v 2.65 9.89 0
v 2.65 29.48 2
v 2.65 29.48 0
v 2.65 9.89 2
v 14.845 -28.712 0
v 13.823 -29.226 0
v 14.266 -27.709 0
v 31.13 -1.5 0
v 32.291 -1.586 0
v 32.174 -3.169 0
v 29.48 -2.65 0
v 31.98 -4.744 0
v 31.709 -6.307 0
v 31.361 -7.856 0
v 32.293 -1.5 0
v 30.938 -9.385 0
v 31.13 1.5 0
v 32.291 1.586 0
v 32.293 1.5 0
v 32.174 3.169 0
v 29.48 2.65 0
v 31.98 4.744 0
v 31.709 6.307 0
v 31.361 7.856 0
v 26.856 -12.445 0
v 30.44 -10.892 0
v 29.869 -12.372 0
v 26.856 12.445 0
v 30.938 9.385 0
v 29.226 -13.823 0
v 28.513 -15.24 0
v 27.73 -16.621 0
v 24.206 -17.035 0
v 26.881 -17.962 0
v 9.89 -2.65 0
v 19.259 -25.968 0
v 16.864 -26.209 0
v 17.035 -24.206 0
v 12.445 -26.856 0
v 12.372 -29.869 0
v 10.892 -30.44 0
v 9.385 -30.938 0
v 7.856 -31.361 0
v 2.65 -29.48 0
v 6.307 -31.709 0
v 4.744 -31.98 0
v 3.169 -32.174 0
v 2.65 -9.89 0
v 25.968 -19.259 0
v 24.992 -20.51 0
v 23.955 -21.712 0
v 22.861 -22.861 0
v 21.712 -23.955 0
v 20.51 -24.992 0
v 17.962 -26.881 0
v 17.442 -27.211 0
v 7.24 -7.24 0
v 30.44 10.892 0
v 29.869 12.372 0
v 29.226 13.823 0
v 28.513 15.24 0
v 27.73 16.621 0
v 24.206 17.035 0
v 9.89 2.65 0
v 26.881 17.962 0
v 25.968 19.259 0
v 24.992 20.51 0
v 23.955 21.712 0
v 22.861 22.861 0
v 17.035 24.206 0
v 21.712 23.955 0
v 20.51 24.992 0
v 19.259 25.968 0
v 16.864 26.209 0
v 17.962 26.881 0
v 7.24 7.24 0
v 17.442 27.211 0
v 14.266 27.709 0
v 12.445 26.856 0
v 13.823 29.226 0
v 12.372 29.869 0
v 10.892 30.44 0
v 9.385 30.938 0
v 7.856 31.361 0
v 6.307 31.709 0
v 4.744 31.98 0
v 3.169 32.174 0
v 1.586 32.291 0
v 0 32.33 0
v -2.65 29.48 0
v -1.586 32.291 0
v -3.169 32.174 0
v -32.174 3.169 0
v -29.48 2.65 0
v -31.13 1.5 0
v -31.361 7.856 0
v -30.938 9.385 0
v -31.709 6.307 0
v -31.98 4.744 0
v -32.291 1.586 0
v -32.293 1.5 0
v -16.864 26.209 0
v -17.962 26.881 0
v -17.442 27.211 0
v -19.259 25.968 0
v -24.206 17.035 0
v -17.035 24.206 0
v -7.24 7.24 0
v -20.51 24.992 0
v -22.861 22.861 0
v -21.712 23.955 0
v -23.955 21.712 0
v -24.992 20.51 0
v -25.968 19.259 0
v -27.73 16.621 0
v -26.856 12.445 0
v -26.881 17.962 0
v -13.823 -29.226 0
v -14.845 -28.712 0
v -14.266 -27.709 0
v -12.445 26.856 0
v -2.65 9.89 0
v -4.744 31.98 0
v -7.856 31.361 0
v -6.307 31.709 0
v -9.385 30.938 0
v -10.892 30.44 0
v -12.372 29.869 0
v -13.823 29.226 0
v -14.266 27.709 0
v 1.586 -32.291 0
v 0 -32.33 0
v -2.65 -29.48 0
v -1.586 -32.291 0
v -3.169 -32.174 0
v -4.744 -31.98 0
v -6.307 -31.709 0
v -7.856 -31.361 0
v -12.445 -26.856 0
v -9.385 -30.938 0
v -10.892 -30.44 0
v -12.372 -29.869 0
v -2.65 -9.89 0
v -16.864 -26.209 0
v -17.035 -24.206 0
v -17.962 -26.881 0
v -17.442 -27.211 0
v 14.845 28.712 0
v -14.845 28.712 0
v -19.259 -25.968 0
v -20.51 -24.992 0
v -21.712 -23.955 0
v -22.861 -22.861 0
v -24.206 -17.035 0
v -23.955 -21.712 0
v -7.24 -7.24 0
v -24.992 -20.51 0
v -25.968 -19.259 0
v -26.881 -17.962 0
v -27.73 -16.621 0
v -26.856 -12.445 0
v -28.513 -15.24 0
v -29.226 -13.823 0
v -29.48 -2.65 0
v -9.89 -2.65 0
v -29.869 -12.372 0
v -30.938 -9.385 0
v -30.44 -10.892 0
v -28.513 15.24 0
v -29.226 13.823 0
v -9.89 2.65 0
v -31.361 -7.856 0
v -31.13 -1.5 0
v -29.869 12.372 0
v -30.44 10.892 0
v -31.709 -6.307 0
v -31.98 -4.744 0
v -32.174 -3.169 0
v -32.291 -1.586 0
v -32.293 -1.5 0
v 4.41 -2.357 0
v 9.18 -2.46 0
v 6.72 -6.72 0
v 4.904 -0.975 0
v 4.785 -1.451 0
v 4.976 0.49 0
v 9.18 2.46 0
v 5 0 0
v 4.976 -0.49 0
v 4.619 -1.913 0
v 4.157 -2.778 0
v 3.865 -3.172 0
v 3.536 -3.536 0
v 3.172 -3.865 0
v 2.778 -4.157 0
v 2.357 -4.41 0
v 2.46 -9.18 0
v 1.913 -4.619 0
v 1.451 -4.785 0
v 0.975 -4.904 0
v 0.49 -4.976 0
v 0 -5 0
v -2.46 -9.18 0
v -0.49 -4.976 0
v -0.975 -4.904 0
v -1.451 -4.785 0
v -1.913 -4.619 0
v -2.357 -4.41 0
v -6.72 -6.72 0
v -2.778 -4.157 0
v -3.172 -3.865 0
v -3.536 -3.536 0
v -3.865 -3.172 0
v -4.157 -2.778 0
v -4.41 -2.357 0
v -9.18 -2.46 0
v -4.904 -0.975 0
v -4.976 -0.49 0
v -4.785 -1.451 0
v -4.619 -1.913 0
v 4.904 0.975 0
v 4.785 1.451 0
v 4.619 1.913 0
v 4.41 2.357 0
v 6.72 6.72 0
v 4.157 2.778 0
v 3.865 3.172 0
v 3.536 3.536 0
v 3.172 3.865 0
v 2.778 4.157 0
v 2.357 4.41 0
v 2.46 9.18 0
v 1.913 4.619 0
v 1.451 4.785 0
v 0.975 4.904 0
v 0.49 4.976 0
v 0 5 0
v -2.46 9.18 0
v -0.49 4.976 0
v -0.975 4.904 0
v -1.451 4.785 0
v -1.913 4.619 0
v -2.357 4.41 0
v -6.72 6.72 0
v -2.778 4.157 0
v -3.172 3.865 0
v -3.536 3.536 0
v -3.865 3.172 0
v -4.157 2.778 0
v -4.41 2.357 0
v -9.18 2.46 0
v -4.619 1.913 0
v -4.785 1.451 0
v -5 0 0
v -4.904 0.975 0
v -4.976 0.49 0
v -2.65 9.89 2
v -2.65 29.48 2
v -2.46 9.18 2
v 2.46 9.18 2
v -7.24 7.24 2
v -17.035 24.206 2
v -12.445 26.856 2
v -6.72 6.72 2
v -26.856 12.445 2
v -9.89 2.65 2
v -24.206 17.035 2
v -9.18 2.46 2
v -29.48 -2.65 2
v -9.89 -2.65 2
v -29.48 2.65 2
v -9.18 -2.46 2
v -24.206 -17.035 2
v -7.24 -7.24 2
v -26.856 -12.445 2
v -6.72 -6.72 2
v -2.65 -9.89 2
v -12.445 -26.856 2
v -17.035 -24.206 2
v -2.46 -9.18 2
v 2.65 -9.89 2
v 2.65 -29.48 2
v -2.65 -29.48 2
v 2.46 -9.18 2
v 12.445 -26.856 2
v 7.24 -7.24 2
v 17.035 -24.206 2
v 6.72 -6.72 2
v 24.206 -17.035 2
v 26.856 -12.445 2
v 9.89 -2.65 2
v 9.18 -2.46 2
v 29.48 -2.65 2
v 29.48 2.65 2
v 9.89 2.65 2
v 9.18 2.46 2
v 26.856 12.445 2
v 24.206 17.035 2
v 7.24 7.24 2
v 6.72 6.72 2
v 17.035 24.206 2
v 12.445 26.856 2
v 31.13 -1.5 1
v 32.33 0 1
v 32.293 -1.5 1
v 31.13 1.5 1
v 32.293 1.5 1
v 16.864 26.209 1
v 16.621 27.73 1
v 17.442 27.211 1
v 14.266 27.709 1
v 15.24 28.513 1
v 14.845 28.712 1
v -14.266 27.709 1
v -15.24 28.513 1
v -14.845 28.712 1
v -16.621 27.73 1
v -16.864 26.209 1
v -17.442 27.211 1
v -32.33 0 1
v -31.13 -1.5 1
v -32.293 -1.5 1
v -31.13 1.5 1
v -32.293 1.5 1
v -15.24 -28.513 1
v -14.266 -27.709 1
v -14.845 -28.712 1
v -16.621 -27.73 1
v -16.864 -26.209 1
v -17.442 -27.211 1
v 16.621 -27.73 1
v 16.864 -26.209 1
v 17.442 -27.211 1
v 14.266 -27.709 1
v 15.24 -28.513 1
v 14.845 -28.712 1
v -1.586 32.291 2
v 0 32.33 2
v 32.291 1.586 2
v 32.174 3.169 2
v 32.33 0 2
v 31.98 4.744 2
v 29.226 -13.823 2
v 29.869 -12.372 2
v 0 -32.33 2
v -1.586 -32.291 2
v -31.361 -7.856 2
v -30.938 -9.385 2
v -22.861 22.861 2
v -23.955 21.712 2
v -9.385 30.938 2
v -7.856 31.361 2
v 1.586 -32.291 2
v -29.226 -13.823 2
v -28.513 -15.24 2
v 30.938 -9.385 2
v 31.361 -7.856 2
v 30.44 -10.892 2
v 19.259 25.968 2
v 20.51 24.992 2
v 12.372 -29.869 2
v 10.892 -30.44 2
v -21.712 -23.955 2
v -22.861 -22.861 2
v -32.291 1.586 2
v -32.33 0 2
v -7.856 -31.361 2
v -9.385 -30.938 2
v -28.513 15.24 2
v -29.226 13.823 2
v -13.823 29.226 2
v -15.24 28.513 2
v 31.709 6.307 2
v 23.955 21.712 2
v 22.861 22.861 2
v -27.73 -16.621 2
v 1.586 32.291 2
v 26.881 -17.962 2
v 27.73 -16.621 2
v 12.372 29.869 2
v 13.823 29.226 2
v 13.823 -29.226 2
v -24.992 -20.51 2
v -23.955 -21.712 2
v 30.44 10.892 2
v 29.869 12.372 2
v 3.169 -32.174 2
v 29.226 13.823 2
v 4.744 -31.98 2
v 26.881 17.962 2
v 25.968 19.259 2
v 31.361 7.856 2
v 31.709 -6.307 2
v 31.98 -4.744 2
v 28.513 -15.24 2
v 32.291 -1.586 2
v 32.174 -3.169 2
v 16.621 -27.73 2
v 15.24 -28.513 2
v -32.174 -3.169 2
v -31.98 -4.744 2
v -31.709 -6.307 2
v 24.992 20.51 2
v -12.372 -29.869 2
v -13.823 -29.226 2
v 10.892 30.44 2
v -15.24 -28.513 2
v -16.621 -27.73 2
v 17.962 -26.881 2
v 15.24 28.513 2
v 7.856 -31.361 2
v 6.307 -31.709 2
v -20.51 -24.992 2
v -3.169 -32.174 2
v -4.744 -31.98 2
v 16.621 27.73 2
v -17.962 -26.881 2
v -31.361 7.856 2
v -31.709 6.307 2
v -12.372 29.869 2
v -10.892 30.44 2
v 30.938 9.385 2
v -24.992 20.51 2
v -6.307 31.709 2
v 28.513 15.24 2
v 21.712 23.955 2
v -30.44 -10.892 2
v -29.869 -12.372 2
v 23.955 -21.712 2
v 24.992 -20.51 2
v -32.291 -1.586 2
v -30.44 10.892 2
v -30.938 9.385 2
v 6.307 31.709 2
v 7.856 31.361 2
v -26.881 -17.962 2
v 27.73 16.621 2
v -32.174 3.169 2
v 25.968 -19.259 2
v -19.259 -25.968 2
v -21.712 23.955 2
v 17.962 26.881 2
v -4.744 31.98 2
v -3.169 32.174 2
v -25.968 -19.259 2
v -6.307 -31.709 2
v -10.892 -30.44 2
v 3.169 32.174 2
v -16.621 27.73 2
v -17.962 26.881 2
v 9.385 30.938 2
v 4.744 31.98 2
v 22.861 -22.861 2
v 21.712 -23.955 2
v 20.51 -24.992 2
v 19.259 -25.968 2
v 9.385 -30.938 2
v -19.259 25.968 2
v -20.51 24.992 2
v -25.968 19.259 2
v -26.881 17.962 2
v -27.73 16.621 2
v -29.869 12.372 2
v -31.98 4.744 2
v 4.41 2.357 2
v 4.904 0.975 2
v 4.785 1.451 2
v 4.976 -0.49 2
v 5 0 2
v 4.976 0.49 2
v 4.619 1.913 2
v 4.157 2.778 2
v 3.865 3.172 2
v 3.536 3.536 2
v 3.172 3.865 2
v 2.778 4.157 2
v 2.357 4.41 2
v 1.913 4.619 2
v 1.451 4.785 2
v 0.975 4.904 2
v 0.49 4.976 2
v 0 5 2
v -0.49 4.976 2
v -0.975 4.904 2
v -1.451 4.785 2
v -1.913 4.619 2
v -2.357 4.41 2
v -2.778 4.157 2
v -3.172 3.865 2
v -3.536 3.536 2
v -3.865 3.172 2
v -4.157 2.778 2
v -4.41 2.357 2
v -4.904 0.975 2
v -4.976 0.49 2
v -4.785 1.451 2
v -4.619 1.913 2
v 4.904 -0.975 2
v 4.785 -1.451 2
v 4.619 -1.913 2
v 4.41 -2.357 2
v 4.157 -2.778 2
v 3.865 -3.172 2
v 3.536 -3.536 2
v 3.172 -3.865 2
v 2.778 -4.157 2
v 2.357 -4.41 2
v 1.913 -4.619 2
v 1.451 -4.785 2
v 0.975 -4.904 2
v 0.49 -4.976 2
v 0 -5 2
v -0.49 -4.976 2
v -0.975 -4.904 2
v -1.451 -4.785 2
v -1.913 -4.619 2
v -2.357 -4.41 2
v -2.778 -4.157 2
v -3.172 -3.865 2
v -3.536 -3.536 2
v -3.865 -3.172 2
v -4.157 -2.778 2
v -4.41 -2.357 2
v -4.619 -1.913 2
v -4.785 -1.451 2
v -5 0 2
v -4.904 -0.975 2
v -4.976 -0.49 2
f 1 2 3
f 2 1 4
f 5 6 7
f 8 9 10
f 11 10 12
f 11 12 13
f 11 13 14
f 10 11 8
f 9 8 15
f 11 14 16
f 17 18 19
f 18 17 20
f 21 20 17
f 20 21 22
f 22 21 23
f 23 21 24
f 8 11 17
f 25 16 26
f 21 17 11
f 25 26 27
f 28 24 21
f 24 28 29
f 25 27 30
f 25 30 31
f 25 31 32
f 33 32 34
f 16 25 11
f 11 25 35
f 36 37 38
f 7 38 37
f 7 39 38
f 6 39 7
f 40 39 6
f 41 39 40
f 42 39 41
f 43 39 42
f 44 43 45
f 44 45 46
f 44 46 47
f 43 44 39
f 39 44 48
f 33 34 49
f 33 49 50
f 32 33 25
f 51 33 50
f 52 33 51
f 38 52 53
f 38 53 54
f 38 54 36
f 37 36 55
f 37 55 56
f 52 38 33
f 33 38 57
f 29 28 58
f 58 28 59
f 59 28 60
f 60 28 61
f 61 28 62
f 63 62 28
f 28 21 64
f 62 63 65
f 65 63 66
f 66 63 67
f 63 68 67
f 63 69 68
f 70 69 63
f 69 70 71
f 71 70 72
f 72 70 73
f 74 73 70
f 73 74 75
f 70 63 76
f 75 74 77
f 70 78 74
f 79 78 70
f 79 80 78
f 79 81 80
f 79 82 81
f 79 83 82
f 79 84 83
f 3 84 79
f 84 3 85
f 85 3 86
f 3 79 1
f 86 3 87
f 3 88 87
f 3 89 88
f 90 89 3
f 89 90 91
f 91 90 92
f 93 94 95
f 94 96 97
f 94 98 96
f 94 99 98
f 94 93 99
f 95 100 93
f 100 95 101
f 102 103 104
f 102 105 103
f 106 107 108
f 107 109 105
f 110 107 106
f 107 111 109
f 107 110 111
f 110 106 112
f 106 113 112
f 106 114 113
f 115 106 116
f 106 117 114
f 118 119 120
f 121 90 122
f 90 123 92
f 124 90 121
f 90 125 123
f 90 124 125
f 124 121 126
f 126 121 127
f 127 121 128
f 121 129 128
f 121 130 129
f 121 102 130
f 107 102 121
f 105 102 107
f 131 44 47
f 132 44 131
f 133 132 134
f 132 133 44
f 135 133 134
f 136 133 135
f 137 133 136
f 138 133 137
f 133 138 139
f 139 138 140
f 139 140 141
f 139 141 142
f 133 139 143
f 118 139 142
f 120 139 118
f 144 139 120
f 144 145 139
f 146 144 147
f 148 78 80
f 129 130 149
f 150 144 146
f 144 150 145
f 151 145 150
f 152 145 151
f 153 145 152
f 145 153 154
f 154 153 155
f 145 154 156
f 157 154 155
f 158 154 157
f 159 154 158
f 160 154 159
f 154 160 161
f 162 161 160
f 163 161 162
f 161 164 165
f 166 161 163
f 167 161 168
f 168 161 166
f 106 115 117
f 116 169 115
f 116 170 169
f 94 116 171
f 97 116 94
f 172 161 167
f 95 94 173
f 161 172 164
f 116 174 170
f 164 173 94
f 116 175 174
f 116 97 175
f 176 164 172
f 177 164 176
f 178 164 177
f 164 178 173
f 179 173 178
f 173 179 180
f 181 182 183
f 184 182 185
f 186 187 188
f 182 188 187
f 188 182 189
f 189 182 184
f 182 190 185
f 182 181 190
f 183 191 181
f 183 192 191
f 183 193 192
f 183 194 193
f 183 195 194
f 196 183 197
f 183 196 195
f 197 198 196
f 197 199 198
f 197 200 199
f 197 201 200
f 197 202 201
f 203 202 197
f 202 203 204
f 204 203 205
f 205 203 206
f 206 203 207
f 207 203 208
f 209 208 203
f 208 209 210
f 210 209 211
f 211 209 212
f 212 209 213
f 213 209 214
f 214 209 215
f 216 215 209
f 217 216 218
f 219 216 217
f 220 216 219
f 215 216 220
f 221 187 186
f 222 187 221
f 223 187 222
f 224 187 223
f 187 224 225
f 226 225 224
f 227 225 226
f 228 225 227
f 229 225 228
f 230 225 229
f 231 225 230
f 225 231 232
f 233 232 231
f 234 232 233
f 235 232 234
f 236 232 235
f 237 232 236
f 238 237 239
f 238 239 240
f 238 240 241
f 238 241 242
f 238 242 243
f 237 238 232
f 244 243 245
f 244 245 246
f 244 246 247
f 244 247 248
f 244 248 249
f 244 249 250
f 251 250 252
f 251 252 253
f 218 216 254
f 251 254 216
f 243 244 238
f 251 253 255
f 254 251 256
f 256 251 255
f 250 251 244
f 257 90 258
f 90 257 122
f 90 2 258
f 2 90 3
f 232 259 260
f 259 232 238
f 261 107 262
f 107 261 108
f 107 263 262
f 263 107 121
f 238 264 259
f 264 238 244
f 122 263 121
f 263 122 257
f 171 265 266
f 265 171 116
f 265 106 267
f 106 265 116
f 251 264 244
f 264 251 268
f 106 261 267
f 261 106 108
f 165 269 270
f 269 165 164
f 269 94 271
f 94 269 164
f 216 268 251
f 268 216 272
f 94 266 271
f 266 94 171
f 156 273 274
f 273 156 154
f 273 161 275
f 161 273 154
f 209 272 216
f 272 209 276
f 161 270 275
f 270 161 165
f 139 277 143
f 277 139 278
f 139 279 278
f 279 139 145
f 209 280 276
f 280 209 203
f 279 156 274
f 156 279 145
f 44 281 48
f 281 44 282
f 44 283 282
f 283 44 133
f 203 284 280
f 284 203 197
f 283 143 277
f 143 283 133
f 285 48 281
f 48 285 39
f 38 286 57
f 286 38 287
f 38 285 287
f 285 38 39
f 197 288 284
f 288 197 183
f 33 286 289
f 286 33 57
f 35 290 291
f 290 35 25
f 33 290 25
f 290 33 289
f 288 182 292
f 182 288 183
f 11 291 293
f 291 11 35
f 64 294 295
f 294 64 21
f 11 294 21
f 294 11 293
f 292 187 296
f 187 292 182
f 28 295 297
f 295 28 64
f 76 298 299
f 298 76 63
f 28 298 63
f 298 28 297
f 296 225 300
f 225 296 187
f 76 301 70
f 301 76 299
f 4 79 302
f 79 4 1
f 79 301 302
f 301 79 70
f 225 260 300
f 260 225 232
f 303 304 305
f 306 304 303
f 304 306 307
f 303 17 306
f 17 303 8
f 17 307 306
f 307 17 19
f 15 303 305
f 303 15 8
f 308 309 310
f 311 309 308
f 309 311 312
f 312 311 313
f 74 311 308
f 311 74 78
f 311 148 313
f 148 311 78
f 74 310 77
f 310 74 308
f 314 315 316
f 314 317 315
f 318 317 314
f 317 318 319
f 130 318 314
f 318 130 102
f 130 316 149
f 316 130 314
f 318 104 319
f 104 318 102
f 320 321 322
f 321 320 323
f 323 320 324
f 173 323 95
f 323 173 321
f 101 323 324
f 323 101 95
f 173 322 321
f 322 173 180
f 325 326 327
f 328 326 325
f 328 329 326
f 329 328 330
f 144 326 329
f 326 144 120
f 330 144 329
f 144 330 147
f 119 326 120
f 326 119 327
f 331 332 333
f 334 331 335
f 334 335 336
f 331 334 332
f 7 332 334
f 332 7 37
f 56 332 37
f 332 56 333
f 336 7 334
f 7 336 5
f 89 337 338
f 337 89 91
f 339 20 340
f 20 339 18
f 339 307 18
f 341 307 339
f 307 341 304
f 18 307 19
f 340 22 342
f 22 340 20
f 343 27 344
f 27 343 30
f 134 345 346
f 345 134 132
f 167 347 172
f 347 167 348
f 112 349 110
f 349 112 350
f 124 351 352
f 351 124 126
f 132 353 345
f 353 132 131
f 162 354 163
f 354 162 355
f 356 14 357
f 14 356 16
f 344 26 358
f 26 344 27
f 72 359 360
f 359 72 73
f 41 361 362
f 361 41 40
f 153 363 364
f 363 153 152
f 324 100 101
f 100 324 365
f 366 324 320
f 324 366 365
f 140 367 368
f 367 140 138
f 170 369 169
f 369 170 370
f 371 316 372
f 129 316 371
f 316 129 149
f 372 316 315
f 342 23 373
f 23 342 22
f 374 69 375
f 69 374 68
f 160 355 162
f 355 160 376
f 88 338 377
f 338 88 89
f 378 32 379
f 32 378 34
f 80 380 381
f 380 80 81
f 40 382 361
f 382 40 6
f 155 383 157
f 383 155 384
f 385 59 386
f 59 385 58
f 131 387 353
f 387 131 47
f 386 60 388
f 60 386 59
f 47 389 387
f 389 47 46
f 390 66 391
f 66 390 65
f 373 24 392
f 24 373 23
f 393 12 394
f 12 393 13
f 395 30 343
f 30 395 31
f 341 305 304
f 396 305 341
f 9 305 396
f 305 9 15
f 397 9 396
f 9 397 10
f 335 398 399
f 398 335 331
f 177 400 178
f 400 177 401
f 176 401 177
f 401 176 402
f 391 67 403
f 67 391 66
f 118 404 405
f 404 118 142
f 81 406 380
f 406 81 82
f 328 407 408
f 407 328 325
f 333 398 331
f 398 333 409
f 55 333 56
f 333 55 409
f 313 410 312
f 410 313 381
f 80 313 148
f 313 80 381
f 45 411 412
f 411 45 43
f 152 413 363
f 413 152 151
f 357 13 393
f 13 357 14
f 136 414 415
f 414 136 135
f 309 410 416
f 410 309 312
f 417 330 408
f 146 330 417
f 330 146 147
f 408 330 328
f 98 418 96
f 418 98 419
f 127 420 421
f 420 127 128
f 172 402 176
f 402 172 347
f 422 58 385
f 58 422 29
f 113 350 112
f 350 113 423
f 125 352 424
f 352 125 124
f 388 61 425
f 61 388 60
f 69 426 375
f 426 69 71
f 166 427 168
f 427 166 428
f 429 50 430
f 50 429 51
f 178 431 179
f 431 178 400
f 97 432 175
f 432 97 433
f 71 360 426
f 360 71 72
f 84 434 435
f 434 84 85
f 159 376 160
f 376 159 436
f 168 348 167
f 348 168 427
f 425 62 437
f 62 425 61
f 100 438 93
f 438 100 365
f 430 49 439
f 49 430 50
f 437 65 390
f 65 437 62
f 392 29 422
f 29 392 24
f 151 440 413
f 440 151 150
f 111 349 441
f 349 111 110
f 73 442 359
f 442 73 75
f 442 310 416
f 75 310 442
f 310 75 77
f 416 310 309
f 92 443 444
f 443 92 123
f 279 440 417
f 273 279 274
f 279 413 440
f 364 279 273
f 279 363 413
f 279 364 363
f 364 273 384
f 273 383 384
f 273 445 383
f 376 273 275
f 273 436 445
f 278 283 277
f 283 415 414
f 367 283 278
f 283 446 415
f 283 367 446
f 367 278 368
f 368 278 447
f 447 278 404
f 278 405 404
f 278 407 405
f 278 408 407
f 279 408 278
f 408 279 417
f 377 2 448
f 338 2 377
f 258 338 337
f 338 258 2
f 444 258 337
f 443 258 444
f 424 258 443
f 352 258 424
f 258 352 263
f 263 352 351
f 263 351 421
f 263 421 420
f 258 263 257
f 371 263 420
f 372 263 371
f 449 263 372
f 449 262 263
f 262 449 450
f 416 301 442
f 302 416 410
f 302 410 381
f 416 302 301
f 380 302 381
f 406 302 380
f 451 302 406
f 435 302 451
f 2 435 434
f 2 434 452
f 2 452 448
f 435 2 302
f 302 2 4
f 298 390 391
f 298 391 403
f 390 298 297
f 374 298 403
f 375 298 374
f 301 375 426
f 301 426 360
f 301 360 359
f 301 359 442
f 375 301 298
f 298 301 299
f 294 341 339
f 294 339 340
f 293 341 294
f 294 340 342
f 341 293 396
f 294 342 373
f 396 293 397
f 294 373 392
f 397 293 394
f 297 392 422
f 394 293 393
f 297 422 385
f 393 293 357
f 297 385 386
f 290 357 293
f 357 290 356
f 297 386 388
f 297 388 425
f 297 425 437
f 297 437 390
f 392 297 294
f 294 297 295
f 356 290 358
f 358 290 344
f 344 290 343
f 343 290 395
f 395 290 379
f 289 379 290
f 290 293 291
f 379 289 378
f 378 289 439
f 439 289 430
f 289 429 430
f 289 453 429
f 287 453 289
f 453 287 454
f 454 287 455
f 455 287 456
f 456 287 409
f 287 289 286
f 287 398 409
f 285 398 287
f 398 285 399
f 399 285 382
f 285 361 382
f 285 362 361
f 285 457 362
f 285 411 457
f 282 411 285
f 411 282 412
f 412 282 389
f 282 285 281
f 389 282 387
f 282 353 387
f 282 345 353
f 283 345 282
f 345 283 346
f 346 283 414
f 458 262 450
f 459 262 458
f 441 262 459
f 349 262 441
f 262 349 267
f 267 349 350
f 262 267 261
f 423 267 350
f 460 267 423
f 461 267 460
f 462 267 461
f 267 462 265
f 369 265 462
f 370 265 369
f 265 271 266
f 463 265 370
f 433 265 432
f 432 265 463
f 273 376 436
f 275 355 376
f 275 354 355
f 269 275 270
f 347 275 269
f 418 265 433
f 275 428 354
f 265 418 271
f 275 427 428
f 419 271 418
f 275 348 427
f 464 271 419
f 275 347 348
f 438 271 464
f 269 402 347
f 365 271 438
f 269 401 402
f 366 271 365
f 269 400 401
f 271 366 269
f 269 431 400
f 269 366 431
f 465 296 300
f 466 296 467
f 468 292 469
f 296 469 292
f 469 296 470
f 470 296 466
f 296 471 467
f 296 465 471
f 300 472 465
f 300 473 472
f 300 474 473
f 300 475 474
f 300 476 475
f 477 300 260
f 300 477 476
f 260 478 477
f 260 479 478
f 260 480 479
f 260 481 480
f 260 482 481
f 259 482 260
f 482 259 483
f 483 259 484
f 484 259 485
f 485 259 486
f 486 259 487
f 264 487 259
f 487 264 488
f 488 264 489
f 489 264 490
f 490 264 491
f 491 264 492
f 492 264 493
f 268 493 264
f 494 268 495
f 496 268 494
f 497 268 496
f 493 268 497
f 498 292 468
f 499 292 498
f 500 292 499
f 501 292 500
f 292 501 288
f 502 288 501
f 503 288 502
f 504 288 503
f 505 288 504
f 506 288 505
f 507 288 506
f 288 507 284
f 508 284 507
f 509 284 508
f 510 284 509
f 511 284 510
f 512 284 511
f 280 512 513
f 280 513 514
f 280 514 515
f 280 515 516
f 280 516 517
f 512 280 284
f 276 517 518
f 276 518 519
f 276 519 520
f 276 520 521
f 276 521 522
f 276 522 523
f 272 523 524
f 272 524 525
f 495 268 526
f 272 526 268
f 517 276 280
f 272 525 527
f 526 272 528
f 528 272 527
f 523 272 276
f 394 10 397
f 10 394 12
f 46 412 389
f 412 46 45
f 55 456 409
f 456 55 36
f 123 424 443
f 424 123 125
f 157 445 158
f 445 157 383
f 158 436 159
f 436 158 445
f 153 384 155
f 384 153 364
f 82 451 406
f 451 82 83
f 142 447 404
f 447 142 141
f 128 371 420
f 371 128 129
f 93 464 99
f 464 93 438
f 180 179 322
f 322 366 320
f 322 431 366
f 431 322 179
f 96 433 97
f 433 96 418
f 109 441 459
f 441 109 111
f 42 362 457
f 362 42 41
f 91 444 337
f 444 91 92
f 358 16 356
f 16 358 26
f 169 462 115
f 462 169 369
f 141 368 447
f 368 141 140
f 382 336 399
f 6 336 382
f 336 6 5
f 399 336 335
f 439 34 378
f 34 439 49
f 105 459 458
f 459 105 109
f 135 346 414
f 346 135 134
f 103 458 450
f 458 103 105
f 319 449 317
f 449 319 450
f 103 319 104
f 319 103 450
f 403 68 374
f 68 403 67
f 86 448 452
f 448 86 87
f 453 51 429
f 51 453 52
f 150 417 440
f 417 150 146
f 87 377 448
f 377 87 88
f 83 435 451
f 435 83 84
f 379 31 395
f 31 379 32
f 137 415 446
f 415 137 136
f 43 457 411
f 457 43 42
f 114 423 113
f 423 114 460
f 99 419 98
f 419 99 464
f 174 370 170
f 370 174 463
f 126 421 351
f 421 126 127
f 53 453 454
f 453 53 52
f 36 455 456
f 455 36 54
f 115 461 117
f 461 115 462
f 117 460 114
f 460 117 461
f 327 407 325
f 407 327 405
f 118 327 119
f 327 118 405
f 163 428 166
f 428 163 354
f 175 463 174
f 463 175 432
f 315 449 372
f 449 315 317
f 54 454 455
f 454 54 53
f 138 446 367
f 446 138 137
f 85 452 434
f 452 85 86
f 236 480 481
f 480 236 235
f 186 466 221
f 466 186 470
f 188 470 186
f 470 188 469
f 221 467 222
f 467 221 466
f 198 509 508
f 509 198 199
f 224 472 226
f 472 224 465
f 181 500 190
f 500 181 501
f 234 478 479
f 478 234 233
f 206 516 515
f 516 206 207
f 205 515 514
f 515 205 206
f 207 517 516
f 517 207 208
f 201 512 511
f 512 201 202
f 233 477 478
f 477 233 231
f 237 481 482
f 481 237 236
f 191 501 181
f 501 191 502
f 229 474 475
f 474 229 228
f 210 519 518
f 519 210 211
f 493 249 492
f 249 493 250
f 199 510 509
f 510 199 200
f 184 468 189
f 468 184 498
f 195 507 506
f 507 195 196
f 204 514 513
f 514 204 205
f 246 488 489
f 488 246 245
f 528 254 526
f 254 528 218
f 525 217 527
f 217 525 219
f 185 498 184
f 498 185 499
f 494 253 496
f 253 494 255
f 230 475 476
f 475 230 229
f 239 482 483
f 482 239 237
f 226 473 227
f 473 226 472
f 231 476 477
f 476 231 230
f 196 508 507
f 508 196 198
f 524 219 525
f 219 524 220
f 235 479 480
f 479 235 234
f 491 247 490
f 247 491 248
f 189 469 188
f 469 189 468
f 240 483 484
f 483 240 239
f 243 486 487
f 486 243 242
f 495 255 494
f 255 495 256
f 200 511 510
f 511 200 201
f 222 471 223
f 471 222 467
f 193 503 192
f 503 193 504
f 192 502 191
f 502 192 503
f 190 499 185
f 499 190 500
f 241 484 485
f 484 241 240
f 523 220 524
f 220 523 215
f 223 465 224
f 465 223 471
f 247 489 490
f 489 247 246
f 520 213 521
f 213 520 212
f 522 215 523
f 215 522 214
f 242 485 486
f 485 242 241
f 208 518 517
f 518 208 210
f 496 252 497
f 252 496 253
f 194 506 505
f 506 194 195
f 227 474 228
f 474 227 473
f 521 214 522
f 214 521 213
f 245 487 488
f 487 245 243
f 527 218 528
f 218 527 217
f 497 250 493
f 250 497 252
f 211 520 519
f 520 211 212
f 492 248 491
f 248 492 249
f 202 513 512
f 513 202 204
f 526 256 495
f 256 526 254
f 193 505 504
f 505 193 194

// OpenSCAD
// =============================================================================
//  Encoder Wheel Frame
//  Generated by generate_3d.py — do not edit by hand; re-run the script.
// =============================================================================
//
//  Render with F6 in OpenSCAD, then File → Export → STL.
//  Requires OpenSCAD 2021.01 or later.
//
//  Coordinate system
//  -----------------
//    Z = wheel axis (print flat on Z = 0 plane)
//    XY = wheel face
//

// ---- Geometry parameters ----------------------------------------
n_magnets       = 12;       // number of magnets
angle_step      = 30.000000; // degrees between magnets
magnet_length   = 20.0;    // radial length (mm)
magnet_width    = 5.0;     // tangential width (mm)
magnet_thick    = 2.0;     // axial thickness (mm)
r_inner         = 9.3301;  // inner radius (mm)
r_outer         = 29.3301;  // outer radius (mm)
r_frame         = 32.3301;  // frame outer radius (mm)
center_bore     = 5.0;     // shaft bore radius (mm)
clearance       = 0.15;    // per-side pocket clearance (mm)

// ---- Pocket dimensions ----------------------------------------
pw              = 5.3;   // pocket width  (tangential)
pl              = 20.3;   // pocket length (radial)
pd              = 2.0;       // pocket depth  (axial)
r_pkt           = 9.1801;  // pocket inner-edge radius

n_clips         = 6;       // number of steel-plate clip slots
clip_width      = 3.0;    // clip slot width (mm)
clip_depth      = 1.2;    // clip slot depth into rim (mm)
clip_height     = 1.0;    // clip slot height (mm)

z_back          = 0.0;    // Z of pocket floor
z_top_magnet    = 2.000;  // Z of pocket opening / magnet top
total_height    = 2.000;  // overall frame height

// ====================================================================
// Module: magnet_pocket()
// One magnet slot, open at the top face (+Z).
// In local coords: +Y = radial outward, +X = tangential CCW, +Z = axial.
// The pocket inner edge sits at r_pkt (slightly inside r_inner).
// ====================================================================
module magnet_pocket() {
    translate([-pw/2, 9.1801, 0.000])
        cube([pw, pl, pd + 1]);  // +1 ensures clean exit through top face
}

// ====================================================================
// Module: clip_slots()
// Rectangular notches around the outer rim that accept a thin steel
// disc snapped in from the back.  The steel disc acts as a flux-return
// backing plate and improves magnetic field concentration.
// ====================================================================
module clip_slots() {
    for (i = [0 : 5]) {
        rotate([0, 0, i * 60.0000])
            translate([31.1301, -1.5000, -0.01])
                cube([1.2100, 3.0000, 1.0100]);
    }
}

// ====================================================================
// Module: encoder_wheel()
// Complete encoder wheel frame — subtract pockets then optionally add
// tabs, front face, and/or steel clip slots.
// ====================================================================
module encoder_wheel() {
    union() {

        // -- Main body: outer ring + (optional) back disc --
        difference() {

            // Solid disc from z=0 to z=total_height
            cylinder(h = 2.000, r = r_frame, $fn = 128);

            // Central shaft bore
            cylinder(h = 2.000 * 3, r = center_bore, center = true, $fn = 64);
            // (No back plate: z_back = 0 so pockets open on bottom face too)

            // Magnet pockets
            for (i = [0 : n_magnets - 1]) {
                rotate([0, 0, i * angle_step])
                    magnet_pocket();
            }

            // Steel backing plate clip slots
            clip_slots();

        }  // end difference

    }  // end union
}  // end encoder_wheel

// ====================================================================
// Render the wheel
// ====================================================================
encoder_wheel();
